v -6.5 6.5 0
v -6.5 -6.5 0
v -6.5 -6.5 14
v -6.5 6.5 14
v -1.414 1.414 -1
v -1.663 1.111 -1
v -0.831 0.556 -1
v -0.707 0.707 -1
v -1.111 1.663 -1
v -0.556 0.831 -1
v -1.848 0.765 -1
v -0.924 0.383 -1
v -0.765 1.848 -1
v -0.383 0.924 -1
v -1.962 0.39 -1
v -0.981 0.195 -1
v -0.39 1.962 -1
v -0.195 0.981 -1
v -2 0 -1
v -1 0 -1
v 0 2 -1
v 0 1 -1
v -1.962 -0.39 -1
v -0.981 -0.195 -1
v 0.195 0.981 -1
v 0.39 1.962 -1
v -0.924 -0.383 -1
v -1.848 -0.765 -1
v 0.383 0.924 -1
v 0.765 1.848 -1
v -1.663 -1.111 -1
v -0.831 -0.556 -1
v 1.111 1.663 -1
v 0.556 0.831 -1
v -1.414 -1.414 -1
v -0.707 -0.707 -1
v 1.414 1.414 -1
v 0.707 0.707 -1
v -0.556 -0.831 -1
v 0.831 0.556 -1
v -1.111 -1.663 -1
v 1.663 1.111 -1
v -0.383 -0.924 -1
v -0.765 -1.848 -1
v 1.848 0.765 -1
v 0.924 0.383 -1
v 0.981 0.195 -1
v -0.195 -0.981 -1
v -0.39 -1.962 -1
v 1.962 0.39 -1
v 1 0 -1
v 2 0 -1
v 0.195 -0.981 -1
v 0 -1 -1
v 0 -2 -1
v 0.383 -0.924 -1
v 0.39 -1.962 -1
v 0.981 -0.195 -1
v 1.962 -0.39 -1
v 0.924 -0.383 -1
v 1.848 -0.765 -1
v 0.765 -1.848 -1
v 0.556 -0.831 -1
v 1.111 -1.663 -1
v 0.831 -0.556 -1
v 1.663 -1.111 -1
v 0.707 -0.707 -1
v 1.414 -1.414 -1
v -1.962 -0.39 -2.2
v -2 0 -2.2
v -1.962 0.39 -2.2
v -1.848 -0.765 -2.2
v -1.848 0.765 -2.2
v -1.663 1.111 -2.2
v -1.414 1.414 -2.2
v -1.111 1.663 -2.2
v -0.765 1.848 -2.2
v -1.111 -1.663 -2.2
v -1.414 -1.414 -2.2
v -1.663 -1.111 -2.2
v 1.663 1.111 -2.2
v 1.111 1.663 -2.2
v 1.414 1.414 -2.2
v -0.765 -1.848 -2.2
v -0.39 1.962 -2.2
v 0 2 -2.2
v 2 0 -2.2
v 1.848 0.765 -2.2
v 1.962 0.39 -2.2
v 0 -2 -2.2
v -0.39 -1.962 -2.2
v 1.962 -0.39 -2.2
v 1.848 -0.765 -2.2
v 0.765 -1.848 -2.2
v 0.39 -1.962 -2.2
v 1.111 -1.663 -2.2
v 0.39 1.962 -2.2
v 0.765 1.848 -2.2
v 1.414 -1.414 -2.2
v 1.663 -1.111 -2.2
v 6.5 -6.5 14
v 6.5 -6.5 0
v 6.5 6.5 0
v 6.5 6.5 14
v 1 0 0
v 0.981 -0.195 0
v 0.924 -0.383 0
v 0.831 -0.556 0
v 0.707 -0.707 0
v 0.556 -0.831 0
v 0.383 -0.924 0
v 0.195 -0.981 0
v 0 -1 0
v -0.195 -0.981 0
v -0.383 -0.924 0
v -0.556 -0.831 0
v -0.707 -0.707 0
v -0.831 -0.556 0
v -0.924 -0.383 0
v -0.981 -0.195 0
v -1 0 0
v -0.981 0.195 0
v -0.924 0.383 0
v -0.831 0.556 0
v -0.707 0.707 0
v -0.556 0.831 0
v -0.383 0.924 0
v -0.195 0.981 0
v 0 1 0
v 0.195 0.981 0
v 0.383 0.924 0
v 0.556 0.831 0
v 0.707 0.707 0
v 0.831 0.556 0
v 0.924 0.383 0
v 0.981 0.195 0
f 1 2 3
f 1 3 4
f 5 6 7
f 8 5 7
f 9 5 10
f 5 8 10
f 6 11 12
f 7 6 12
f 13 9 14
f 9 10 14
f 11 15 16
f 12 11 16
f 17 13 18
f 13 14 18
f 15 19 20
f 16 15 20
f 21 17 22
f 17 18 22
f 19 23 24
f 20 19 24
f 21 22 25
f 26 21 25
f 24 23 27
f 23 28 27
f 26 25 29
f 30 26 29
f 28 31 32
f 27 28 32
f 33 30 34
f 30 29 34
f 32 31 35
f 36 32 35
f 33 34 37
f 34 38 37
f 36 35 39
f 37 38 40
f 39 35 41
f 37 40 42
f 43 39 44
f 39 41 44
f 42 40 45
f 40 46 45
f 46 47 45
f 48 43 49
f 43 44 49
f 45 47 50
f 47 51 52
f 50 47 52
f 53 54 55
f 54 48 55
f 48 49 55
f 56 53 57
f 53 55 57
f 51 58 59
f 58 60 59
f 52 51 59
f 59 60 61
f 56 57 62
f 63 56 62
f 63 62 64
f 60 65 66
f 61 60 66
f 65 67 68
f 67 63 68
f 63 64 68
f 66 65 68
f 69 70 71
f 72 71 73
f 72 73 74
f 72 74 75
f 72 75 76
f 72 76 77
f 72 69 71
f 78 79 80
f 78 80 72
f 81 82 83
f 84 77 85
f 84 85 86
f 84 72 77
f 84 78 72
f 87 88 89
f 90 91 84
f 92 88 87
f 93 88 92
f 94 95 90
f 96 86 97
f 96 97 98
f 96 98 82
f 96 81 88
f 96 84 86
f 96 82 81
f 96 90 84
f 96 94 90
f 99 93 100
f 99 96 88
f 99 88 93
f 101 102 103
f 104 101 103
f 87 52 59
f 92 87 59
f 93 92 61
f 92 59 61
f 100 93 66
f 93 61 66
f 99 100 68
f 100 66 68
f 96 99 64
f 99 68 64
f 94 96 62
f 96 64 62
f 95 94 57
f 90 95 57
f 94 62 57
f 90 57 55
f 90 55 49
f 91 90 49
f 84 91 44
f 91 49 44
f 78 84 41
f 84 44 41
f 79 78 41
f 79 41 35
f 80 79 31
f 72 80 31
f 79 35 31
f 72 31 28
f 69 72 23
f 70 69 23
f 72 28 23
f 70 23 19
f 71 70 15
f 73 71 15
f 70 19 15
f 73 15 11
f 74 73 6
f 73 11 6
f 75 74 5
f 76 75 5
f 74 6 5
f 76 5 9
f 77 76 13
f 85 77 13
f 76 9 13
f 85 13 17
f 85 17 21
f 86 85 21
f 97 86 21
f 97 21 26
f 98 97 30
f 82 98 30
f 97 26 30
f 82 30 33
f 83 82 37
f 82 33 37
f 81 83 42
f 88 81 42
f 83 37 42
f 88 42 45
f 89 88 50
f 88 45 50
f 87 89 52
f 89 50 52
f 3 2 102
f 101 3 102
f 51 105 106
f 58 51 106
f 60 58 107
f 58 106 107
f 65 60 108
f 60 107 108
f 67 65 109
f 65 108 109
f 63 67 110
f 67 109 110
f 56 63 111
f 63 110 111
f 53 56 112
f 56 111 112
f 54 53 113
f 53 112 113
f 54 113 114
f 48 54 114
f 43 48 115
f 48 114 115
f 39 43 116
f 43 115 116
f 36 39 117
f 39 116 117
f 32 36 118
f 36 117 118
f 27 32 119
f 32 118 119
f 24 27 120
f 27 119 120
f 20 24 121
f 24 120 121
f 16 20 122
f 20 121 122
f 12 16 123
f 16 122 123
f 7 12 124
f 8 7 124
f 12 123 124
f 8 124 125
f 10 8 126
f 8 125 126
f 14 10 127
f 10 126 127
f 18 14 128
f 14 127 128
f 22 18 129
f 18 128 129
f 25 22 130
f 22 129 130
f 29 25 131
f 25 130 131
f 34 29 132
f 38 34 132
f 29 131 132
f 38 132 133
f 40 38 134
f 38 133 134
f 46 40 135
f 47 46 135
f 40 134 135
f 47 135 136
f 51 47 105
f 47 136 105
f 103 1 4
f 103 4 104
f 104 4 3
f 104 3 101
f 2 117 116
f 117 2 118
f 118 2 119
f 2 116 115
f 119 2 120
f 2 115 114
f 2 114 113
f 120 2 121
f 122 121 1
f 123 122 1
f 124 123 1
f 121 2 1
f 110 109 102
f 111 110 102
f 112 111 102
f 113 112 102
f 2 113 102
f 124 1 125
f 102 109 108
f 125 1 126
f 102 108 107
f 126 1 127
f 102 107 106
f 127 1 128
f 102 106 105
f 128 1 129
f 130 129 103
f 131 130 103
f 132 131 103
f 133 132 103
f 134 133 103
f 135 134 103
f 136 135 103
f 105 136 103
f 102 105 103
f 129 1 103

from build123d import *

# Parameters (mm, degrees)
F0_W     = 13
F0_H     = 13
F1_DEPTH = 14
F2_R     = 1
F3_DEPTH = 1
F4_R     = 2
F5_DEPTH = 1.2


with BuildPart() as f1:
    # F0 (on Top) → F1 (new body)
    with BuildSketch(Plane.XY):
        Rectangle(F0_W, F0_H)
    extrude(amount=F1_DEPTH)

    # F2 (on face) → F3 (join)
    with BuildSketch(Plane(origin=(0, 0, 0), x_dir=(1, 0, 0), z_dir=(0, 0, -1))):
        Circle(F2_R)
    extrude(amount=F3_DEPTH)

    # F4 (on face) → F5 (join)
    with BuildSketch(Plane(origin=(0, 0, -1), x_dir=(1, 0, 0), z_dir=(0, 0, -1))):
        Circle(F4_R)
    extrude(amount=F5_DEPTH)


solid = f1.part
